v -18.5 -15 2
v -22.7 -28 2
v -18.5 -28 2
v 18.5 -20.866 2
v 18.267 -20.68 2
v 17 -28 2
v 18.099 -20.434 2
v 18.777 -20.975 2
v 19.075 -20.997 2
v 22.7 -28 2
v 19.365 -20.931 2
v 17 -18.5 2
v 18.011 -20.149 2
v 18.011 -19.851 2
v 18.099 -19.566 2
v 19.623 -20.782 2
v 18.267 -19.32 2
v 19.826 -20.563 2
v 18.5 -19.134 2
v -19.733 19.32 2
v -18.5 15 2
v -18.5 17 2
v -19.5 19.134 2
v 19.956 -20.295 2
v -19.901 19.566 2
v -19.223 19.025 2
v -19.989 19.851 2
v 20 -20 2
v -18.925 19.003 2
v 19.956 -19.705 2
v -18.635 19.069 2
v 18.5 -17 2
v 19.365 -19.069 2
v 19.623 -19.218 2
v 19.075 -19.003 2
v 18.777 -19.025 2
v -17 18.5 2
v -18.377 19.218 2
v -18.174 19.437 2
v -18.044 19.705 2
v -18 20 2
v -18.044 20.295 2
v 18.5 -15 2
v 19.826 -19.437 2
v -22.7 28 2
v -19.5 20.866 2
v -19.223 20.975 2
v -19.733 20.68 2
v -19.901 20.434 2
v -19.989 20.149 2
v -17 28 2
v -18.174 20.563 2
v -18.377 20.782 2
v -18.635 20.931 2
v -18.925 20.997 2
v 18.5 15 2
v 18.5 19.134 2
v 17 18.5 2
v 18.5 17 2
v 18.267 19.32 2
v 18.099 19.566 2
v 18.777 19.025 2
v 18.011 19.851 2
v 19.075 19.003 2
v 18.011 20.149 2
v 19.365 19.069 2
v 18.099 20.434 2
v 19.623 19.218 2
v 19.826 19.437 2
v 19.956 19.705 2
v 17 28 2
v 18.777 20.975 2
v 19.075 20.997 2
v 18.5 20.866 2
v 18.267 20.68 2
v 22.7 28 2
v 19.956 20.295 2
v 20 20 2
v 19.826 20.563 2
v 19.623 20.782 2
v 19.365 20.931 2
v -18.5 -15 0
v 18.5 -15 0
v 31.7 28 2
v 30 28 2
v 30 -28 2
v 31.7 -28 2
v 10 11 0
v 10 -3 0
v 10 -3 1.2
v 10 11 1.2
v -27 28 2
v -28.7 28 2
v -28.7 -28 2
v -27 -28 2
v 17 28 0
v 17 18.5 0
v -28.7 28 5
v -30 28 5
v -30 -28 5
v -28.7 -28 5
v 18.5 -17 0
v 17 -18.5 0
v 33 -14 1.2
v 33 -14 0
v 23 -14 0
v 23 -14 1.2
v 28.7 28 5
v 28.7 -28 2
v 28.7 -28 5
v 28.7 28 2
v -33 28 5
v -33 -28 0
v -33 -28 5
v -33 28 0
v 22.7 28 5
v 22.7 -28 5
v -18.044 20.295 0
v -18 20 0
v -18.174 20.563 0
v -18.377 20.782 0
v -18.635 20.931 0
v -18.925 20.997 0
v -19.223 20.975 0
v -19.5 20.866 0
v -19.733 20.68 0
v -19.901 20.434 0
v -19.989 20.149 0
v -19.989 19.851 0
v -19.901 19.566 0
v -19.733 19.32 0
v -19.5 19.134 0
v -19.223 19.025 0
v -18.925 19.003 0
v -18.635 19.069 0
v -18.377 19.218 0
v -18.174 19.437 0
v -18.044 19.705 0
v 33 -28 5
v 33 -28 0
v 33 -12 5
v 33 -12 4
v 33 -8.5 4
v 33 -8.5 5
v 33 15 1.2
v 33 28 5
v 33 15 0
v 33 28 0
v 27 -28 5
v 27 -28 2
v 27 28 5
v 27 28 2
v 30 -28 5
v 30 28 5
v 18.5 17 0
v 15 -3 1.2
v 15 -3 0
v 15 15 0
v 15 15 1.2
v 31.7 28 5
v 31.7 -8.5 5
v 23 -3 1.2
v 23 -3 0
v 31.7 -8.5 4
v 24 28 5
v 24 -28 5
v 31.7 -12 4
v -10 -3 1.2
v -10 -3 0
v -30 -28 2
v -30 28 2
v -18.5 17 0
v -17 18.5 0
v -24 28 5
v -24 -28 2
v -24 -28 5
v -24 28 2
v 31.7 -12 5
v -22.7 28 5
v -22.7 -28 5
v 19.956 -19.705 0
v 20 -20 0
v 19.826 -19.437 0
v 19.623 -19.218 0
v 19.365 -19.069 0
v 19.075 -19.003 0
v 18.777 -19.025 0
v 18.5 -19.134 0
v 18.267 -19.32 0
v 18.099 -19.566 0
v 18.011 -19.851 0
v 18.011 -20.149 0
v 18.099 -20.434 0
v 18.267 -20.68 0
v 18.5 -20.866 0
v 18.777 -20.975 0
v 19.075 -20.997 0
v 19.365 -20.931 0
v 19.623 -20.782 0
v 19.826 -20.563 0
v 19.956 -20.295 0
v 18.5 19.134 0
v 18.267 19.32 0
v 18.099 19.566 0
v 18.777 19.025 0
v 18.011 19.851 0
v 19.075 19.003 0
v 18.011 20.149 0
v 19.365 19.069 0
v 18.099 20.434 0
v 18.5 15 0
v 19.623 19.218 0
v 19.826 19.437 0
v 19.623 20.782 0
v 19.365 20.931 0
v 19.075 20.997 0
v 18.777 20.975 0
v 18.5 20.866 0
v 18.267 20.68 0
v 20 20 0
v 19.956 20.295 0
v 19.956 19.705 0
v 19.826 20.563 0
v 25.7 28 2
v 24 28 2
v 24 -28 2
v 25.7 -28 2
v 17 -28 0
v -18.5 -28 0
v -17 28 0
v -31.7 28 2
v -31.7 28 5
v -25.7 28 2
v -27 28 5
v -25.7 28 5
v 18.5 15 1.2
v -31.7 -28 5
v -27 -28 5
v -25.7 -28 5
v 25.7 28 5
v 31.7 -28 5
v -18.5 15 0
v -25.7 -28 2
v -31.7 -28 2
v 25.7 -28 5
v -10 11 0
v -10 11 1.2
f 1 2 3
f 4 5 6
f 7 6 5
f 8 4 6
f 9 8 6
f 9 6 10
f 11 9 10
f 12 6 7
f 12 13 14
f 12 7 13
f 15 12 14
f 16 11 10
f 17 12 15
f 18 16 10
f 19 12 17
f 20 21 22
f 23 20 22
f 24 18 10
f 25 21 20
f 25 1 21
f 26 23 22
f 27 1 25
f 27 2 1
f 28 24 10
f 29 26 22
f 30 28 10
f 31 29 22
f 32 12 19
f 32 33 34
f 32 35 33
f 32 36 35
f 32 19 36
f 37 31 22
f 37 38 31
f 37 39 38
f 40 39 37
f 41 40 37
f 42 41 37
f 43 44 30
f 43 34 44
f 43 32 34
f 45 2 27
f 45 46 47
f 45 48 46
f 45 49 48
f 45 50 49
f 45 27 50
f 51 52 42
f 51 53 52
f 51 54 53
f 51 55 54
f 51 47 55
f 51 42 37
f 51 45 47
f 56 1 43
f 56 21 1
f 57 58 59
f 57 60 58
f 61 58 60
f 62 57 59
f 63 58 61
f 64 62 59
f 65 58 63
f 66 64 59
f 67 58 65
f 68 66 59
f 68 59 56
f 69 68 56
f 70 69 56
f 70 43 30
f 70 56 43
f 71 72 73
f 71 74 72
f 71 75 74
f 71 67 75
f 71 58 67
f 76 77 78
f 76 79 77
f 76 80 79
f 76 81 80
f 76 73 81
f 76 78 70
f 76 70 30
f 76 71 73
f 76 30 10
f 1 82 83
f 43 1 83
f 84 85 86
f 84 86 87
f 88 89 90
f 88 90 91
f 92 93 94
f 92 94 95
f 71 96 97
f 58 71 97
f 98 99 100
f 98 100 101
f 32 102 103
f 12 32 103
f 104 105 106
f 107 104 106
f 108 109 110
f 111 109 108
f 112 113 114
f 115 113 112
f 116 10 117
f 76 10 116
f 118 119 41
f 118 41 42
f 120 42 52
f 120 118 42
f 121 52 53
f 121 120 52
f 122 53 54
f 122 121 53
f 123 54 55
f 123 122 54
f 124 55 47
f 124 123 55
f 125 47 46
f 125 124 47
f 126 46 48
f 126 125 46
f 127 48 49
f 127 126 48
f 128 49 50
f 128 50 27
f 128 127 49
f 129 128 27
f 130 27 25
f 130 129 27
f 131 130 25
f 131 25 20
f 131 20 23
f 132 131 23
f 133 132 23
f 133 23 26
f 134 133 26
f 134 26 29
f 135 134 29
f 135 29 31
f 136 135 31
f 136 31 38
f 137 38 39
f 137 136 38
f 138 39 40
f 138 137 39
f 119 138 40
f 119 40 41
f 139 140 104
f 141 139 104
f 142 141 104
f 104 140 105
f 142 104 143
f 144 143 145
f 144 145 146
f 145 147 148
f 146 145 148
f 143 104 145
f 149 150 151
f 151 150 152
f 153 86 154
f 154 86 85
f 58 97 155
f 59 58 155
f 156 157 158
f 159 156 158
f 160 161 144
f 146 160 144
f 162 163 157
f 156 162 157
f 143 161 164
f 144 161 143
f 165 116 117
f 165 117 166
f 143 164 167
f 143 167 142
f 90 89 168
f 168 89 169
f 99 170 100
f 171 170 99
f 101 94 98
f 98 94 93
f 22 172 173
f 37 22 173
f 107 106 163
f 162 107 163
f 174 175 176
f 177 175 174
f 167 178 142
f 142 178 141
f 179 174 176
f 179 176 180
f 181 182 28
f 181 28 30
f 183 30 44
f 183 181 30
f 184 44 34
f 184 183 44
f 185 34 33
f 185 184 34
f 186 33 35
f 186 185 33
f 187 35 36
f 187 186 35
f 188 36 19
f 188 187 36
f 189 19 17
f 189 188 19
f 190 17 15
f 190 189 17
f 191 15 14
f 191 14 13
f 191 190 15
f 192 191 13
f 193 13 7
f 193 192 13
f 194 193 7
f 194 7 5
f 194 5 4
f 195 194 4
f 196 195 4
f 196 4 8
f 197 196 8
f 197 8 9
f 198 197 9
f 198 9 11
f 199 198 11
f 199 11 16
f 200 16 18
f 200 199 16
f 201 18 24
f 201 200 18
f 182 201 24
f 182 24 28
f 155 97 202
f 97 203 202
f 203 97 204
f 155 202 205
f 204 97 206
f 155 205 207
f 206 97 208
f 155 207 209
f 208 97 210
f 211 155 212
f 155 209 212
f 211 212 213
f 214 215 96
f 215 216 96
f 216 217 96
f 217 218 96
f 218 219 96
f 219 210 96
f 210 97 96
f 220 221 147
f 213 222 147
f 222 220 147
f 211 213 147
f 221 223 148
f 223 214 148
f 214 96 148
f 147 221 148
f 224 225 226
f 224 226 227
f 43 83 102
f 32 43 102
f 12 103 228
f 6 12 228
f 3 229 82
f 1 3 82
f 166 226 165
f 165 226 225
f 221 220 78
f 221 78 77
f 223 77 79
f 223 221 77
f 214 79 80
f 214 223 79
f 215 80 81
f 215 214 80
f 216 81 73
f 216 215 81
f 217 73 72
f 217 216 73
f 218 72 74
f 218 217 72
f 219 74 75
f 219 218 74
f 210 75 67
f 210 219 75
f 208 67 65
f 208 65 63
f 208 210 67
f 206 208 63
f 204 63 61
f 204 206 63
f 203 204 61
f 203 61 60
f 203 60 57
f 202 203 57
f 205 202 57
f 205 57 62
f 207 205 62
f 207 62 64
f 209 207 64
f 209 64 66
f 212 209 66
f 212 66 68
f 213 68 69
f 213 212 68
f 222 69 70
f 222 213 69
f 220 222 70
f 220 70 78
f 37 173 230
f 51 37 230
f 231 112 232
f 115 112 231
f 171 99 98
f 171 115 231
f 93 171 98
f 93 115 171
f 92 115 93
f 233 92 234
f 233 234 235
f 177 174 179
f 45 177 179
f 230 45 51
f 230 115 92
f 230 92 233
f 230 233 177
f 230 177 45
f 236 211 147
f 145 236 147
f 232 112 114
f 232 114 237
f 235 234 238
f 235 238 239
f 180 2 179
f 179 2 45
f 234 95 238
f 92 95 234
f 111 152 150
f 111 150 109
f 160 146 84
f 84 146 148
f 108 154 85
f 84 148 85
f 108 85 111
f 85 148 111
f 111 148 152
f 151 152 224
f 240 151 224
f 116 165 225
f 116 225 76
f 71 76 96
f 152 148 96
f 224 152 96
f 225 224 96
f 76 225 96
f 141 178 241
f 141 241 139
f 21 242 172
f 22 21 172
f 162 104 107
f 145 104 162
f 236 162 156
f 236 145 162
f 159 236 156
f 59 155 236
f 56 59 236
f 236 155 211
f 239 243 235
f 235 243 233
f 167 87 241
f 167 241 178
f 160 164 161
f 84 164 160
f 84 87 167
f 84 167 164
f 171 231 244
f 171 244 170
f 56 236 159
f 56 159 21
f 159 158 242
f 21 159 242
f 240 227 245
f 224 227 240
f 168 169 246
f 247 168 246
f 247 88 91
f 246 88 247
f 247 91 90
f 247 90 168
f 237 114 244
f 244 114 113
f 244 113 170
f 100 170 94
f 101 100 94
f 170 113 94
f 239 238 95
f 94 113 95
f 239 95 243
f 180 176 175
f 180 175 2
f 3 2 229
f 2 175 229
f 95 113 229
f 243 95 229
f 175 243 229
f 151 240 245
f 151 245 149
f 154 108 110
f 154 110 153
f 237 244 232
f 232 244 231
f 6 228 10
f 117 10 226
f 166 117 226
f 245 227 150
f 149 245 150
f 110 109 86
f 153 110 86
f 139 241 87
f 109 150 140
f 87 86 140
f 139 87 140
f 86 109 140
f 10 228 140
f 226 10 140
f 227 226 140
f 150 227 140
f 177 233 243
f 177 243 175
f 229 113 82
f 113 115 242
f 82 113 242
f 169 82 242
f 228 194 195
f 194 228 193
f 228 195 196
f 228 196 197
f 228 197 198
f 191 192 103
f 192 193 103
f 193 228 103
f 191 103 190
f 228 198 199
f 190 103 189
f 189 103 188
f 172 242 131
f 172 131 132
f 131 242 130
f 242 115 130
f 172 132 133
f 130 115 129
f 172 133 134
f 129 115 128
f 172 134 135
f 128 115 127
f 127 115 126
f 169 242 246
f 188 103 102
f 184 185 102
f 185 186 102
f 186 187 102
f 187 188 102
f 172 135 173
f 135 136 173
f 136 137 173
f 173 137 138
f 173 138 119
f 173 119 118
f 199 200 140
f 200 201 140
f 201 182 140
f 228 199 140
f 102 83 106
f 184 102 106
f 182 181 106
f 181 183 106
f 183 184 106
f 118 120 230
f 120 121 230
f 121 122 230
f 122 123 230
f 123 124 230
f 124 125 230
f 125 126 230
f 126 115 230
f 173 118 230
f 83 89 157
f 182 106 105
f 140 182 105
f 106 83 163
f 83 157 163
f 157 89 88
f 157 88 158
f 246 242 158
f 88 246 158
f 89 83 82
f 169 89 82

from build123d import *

# Parameters (mm, degrees)
SKETCH_1_R          = 1
EXTRUDE_1_DEPTH     = 2
SKETCH_2_W          = 1.3
SKETCH_2_H          = 56
EXTRUDE_2_DEPTH     = 3
SKETCH_3_W          = 10
SKETCH_3_H          = 11
SKETCH_3_W_2        = 20
SKETCH_3_H_2        = 14
CUT_EXTRUDE_1_DEPTH = 1.2
SKETCH_4_W          = 1.3
SKETCH_4_H          = 3.5
CUT_EXTRUDE_2_DEPTH = 1


with BuildPart() as part:
    # 草图1 → 凸台-拉伸1 (new body)
    with BuildSketch(Plane.XY):
        Polygon((18.5, 15), (-18.5, 15), (-18.5, 17), (-17, 18.5), (-17, 28), (-33, 28), (-33, -28), (-18.5, -28), (-18.5, -17), (-18.5, -15), (18.5, -15), (18.5, -17), (17, -18.5), (17, -28), (33, -28), (33, 28), (17, 28), (17, 18.5), (18.5, 17), align=None)
        with Locations((19, -20)):
            Circle(SKETCH_1_R, mode=Mode.SUBTRACT)
        with Locations((-19, 20)):
            Circle(SKETCH_1_R, mode=Mode.SUBTRACT)
        with Locations((19, 20)):
            Circle(SKETCH_1_R, mode=Mode.SUBTRACT)
    extrude(amount=EXTRUDE_1_DEPTH)

    # 草图2 → 凸台-拉伸2 (add)
    with BuildSketch(Plane.XY.offset(2)):
        with Locations((-32.35, 0)):
            Rectangle(SKETCH_2_W, SKETCH_2_H)
        with Locations((32.35, 0)):
            Rectangle(SKETCH_2_W, SKETCH_2_H)
        with Locations((-29.35, 0)):
            Rectangle(SKETCH_2_W, SKETCH_2_H)
        with Locations((-26.35, 0)):
            Rectangle(SKETCH_2_W, SKETCH_2_H)
        with Locations((-23.35, 0)):
            Rectangle(SKETCH_2_W, SKETCH_2_H)
        with Locations((29.35, 0)):
            Rectangle(SKETCH_2_W, SKETCH_2_H)
        with Locations((26.35, 0)):
            Rectangle(SKETCH_2_W, SKETCH_2_H)
        with Locations((23.35, 0)):
            Rectangle(SKETCH_2_W, SKETCH_2_H)
    extrude(amount=EXTRUDE_2_DEPTH)

    # 草图3 → 切除-拉伸1 (cut)
    with BuildSketch(Plane(origin=(0, 0, 0), x_dir=(-1, 0, 0), z_dir=(0, 0, -1))):
        Polygon((-15, -3), (-15, 15), (-18.5, 15), (-33, 15), (-33, -3), (-23, -3), align=None)
        with Locations((-28, -8.5)):
            Rectangle(SKETCH_3_W, SKETCH_3_H)
        with Locations((0, 4)):
            Rectangle(SKETCH_3_W_2, SKETCH_3_H_2)
    extrude(amount=-CUT_EXTRUDE_1_DEPTH, mode=Mode.SUBTRACT)

    # 草图4 → 切除-拉伸2 (cut)
    with BuildSketch(Plane.XY.offset(5)):
        with Locations((32.35, -10.25)):
            Rectangle(SKETCH_4_W, SKETCH_4_H)
    extrude(amount=-CUT_EXTRUDE_2_DEPTH, mode=Mode.SUBTRACT)


solid = part.part
